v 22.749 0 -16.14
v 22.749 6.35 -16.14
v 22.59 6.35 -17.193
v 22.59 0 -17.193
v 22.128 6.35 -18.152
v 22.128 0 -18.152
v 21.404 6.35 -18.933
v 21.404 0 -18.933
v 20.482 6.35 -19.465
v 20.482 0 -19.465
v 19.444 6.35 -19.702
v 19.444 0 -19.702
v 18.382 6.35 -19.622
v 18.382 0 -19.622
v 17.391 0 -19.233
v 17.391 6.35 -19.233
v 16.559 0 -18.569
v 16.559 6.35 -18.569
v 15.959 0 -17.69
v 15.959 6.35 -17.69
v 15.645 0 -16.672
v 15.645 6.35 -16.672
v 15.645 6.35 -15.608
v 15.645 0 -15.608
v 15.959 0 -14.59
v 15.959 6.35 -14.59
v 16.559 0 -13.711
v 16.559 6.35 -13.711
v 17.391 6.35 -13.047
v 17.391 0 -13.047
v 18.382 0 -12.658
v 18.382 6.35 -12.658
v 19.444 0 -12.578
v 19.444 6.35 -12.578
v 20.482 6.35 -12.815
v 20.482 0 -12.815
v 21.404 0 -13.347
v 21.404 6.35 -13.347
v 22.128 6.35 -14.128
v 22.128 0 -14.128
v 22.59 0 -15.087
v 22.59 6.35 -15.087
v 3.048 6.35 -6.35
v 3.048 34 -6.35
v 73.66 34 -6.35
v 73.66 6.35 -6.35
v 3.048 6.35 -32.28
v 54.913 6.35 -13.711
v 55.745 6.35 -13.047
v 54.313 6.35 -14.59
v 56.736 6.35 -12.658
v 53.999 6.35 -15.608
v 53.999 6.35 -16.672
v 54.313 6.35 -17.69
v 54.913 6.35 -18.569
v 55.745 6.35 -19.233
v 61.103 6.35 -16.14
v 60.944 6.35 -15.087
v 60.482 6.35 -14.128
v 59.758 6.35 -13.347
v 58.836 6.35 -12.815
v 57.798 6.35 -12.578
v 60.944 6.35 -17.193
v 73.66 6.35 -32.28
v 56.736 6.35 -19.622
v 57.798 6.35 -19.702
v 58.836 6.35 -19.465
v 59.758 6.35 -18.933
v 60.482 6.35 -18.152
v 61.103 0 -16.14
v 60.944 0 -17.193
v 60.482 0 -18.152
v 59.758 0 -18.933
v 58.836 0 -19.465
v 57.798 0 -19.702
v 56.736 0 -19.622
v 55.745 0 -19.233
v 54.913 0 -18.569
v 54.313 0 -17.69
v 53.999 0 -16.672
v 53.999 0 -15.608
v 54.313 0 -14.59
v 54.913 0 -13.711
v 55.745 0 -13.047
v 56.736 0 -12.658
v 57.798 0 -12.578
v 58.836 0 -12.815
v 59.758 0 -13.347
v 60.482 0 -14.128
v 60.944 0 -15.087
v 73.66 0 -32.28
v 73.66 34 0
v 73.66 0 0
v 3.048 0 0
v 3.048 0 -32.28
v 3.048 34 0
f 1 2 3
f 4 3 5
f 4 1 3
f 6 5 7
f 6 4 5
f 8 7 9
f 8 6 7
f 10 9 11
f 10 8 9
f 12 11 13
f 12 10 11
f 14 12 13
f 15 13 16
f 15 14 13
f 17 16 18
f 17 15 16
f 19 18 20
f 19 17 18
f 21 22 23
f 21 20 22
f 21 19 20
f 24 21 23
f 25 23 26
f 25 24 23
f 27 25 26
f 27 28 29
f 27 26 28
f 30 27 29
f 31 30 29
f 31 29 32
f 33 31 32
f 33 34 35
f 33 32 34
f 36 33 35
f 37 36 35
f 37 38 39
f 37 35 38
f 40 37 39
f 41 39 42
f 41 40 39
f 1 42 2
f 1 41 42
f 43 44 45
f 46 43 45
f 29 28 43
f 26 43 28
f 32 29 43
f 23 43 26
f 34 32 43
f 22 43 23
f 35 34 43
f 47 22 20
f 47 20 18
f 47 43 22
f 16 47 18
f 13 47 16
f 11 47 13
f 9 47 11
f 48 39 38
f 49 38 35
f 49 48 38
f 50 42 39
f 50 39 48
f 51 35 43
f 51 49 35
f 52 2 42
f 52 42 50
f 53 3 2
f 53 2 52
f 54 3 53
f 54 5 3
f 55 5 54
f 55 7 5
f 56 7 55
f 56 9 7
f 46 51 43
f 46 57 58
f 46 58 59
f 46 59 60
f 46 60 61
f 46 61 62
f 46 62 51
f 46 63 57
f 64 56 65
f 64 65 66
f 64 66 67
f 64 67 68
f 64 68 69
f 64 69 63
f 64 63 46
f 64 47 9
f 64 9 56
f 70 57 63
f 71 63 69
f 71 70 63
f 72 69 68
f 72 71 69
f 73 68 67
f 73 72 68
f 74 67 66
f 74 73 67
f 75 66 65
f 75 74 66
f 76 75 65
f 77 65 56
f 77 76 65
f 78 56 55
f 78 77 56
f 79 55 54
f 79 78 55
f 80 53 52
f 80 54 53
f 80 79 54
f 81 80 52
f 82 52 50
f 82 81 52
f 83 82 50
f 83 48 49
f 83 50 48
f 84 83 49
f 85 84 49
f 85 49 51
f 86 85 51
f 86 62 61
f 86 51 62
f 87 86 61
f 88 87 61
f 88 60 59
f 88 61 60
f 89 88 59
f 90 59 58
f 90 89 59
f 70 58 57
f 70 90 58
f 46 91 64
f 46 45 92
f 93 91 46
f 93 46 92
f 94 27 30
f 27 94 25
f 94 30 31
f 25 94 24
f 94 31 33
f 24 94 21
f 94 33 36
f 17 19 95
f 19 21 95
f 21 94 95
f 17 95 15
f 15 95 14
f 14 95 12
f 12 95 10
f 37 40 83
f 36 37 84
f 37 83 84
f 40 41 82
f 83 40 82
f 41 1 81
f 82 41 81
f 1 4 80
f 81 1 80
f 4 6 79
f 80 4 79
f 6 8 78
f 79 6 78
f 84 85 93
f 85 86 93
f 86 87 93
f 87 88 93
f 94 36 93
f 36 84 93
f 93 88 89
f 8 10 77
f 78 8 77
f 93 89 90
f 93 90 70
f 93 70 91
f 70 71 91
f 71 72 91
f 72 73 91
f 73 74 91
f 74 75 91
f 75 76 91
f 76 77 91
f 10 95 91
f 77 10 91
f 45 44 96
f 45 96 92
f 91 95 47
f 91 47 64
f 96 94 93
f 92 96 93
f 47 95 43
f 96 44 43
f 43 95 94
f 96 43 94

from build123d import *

# Parameters (mm, degrees)
SKETCH1_W               = 76.708
SKETCH1_H               = 32.2799964
SKETCH1_R               = 3.571875
MAIN_BODY_DEPTH         = 34
SKETCH13_W              = 76.708
SKETCH13_H              = 25.9299964
CUT_EXTRUDE1_DEPTH      = 27.65
SKETCH14_OUTSIDE_W      = 96.688
SKETCH14_OUTSIDE_H      = 52.26
SKETCH14_OUTSIDE_W_2    = 70.612
SKETCH14_OUTSIDE_H_2    = 32.2799964
CUT_EXTRUDE2_DEPTH      = 1
CUT_EXTRUDE2_DEPTH_BACK = 35


with BuildPart() as part:
    # Sketch1 → Main Body (new body)
    with BuildSketch(Plane(origin=(0, 0, 0), x_dir=(1, 0, 0), z_dir=(0, 1, 0))):
        with Locations((38.354, 16.1399982)):
            Rectangle(SKETCH1_W, SKETCH1_H)
        with Locations((19.177, 16.1399982)):
            Circle(SKETCH1_R, mode=Mode.SUBTRACT)
        with Locations((57.531, 16.1399982)):
            Circle(SKETCH1_R, mode=Mode.SUBTRACT)
    extrude(amount=MAIN_BODY_DEPTH)

    # Sketch13 → Cut-Extrude1 (cut)
    with BuildSketch(Plane(origin=(0, 34, 0), x_dir=(1, 0, 0), z_dir=(0, 1, 0))):
        with Locations((38.354, 19.3149982)):
            Rectangle(SKETCH13_W, SKETCH13_H)
    extrude(amount=-CUT_EXTRUDE1_DEPTH, mode=Mode.SUBTRACT)

    # Sketch14 outside → Cut-Extrude2 (cut, two sides)
    with BuildSketch(Plane.XZ) as cut_extrude2_sk:
        with Locations((38.354, -16.14)):
            Rectangle(SKETCH14_OUTSIDE_W, SKETCH14_OUTSIDE_H)
        with Locations((38.354, -16.1399982)):
            Rectangle(SKETCH14_OUTSIDE_W_2, SKETCH14_OUTSIDE_H_2, mode=Mode.SUBTRACT)
    extrude(amount=CUT_EXTRUDE2_DEPTH, mode=Mode.SUBTRACT)
    extrude(cut_extrude2_sk.sketch, amount=-CUT_EXTRUDE2_DEPTH_BACK, mode=Mode.SUBTRACT)


solid = part.part
